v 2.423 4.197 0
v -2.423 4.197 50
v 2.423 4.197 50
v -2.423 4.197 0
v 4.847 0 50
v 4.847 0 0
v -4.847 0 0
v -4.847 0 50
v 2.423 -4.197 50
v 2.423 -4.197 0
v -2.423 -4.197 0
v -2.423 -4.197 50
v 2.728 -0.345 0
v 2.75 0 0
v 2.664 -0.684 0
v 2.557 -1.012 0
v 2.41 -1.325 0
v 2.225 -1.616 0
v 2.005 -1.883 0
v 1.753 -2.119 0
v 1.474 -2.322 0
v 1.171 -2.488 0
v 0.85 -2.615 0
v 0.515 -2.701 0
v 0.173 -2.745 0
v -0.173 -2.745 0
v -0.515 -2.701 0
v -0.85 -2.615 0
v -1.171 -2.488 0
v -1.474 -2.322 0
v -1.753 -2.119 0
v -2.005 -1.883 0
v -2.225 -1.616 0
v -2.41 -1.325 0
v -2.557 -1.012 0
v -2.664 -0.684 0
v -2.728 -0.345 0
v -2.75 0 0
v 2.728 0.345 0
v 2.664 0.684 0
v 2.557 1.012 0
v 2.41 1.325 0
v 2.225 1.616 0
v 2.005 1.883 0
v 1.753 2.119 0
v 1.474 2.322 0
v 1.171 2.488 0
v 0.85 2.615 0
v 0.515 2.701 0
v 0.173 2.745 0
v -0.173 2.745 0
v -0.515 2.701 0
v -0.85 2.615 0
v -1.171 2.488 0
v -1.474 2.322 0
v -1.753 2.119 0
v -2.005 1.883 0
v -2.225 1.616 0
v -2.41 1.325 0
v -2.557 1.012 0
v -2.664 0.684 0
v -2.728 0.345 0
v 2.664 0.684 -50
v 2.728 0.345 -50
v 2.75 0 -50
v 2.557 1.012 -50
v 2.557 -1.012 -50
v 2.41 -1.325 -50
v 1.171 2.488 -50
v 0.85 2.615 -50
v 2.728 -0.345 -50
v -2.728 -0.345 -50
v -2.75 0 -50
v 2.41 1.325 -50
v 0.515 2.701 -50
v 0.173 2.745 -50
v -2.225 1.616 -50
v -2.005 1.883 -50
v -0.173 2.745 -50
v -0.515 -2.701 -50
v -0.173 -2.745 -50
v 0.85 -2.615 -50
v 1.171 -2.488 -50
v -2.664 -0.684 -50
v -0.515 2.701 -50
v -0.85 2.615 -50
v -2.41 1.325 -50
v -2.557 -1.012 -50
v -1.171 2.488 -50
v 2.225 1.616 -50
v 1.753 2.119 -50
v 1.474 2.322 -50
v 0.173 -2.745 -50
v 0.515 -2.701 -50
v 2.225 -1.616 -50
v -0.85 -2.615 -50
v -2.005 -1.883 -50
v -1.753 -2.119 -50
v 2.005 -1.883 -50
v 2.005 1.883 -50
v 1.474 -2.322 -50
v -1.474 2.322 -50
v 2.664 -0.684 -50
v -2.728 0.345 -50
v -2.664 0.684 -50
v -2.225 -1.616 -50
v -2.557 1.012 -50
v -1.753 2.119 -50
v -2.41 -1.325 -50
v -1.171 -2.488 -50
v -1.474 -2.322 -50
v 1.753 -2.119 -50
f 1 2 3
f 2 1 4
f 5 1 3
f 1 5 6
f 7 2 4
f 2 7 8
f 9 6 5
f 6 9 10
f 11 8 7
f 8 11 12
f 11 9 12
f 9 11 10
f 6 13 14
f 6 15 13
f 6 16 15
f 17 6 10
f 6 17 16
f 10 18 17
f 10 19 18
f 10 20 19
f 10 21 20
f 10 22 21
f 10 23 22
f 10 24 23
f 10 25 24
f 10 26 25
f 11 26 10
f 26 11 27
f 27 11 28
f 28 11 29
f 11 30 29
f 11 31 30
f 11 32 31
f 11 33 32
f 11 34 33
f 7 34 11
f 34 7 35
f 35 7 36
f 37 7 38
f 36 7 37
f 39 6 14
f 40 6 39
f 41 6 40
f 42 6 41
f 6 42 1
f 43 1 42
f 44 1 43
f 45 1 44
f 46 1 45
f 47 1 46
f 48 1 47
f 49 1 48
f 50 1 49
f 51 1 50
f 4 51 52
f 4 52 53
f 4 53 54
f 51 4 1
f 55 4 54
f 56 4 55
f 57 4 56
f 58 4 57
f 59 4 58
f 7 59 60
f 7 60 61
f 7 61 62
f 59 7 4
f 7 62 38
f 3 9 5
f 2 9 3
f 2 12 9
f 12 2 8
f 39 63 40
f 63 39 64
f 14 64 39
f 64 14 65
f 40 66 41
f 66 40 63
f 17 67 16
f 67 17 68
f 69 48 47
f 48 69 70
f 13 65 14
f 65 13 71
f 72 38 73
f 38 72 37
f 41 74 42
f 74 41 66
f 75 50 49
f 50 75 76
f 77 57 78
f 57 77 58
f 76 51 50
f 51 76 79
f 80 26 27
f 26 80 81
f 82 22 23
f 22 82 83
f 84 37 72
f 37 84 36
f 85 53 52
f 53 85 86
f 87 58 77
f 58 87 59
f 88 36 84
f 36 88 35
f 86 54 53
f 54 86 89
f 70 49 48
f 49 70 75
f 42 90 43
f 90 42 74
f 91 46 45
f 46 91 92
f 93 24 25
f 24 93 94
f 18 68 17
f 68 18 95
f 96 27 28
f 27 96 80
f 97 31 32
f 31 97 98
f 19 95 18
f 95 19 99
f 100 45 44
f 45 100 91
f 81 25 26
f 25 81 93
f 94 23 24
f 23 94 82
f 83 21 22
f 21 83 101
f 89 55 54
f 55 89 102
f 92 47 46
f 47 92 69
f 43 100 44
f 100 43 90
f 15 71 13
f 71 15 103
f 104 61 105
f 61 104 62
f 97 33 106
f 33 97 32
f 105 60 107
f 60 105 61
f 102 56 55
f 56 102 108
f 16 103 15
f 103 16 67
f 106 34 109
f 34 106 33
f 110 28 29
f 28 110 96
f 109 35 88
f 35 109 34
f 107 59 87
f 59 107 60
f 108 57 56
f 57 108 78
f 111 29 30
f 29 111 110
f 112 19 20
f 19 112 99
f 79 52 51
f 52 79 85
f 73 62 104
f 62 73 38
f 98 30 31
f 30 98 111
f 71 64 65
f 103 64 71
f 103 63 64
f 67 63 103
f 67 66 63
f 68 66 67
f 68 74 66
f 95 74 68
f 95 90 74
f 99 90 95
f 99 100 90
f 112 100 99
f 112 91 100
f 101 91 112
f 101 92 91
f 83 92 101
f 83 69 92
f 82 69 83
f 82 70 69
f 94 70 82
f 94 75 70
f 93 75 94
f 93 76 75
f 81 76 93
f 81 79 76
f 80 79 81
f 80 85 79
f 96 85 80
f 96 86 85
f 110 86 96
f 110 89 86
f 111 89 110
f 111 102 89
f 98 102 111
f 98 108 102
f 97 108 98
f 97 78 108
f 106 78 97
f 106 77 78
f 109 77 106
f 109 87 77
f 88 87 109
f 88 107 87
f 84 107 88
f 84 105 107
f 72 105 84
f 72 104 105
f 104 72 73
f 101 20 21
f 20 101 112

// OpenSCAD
$fn = 50;


difference() {
	union() {
		linear_extrude(height = 50) {
			polygon(points = [[4.8468000000, 0.0000000000], [2.4234000000, 4.1974519271], [-2.4234000000, 4.1974519271], [-4.8468000000, 0.0000000000], [-2.4234000000, -4.1974519271], [2.4234000000, -4.1974519271]]);
		}
		translate(v = [0, 0, -50]) {
			cylinder(h = 50, r = 2.7500000000);
		}
	}
	union();
}
